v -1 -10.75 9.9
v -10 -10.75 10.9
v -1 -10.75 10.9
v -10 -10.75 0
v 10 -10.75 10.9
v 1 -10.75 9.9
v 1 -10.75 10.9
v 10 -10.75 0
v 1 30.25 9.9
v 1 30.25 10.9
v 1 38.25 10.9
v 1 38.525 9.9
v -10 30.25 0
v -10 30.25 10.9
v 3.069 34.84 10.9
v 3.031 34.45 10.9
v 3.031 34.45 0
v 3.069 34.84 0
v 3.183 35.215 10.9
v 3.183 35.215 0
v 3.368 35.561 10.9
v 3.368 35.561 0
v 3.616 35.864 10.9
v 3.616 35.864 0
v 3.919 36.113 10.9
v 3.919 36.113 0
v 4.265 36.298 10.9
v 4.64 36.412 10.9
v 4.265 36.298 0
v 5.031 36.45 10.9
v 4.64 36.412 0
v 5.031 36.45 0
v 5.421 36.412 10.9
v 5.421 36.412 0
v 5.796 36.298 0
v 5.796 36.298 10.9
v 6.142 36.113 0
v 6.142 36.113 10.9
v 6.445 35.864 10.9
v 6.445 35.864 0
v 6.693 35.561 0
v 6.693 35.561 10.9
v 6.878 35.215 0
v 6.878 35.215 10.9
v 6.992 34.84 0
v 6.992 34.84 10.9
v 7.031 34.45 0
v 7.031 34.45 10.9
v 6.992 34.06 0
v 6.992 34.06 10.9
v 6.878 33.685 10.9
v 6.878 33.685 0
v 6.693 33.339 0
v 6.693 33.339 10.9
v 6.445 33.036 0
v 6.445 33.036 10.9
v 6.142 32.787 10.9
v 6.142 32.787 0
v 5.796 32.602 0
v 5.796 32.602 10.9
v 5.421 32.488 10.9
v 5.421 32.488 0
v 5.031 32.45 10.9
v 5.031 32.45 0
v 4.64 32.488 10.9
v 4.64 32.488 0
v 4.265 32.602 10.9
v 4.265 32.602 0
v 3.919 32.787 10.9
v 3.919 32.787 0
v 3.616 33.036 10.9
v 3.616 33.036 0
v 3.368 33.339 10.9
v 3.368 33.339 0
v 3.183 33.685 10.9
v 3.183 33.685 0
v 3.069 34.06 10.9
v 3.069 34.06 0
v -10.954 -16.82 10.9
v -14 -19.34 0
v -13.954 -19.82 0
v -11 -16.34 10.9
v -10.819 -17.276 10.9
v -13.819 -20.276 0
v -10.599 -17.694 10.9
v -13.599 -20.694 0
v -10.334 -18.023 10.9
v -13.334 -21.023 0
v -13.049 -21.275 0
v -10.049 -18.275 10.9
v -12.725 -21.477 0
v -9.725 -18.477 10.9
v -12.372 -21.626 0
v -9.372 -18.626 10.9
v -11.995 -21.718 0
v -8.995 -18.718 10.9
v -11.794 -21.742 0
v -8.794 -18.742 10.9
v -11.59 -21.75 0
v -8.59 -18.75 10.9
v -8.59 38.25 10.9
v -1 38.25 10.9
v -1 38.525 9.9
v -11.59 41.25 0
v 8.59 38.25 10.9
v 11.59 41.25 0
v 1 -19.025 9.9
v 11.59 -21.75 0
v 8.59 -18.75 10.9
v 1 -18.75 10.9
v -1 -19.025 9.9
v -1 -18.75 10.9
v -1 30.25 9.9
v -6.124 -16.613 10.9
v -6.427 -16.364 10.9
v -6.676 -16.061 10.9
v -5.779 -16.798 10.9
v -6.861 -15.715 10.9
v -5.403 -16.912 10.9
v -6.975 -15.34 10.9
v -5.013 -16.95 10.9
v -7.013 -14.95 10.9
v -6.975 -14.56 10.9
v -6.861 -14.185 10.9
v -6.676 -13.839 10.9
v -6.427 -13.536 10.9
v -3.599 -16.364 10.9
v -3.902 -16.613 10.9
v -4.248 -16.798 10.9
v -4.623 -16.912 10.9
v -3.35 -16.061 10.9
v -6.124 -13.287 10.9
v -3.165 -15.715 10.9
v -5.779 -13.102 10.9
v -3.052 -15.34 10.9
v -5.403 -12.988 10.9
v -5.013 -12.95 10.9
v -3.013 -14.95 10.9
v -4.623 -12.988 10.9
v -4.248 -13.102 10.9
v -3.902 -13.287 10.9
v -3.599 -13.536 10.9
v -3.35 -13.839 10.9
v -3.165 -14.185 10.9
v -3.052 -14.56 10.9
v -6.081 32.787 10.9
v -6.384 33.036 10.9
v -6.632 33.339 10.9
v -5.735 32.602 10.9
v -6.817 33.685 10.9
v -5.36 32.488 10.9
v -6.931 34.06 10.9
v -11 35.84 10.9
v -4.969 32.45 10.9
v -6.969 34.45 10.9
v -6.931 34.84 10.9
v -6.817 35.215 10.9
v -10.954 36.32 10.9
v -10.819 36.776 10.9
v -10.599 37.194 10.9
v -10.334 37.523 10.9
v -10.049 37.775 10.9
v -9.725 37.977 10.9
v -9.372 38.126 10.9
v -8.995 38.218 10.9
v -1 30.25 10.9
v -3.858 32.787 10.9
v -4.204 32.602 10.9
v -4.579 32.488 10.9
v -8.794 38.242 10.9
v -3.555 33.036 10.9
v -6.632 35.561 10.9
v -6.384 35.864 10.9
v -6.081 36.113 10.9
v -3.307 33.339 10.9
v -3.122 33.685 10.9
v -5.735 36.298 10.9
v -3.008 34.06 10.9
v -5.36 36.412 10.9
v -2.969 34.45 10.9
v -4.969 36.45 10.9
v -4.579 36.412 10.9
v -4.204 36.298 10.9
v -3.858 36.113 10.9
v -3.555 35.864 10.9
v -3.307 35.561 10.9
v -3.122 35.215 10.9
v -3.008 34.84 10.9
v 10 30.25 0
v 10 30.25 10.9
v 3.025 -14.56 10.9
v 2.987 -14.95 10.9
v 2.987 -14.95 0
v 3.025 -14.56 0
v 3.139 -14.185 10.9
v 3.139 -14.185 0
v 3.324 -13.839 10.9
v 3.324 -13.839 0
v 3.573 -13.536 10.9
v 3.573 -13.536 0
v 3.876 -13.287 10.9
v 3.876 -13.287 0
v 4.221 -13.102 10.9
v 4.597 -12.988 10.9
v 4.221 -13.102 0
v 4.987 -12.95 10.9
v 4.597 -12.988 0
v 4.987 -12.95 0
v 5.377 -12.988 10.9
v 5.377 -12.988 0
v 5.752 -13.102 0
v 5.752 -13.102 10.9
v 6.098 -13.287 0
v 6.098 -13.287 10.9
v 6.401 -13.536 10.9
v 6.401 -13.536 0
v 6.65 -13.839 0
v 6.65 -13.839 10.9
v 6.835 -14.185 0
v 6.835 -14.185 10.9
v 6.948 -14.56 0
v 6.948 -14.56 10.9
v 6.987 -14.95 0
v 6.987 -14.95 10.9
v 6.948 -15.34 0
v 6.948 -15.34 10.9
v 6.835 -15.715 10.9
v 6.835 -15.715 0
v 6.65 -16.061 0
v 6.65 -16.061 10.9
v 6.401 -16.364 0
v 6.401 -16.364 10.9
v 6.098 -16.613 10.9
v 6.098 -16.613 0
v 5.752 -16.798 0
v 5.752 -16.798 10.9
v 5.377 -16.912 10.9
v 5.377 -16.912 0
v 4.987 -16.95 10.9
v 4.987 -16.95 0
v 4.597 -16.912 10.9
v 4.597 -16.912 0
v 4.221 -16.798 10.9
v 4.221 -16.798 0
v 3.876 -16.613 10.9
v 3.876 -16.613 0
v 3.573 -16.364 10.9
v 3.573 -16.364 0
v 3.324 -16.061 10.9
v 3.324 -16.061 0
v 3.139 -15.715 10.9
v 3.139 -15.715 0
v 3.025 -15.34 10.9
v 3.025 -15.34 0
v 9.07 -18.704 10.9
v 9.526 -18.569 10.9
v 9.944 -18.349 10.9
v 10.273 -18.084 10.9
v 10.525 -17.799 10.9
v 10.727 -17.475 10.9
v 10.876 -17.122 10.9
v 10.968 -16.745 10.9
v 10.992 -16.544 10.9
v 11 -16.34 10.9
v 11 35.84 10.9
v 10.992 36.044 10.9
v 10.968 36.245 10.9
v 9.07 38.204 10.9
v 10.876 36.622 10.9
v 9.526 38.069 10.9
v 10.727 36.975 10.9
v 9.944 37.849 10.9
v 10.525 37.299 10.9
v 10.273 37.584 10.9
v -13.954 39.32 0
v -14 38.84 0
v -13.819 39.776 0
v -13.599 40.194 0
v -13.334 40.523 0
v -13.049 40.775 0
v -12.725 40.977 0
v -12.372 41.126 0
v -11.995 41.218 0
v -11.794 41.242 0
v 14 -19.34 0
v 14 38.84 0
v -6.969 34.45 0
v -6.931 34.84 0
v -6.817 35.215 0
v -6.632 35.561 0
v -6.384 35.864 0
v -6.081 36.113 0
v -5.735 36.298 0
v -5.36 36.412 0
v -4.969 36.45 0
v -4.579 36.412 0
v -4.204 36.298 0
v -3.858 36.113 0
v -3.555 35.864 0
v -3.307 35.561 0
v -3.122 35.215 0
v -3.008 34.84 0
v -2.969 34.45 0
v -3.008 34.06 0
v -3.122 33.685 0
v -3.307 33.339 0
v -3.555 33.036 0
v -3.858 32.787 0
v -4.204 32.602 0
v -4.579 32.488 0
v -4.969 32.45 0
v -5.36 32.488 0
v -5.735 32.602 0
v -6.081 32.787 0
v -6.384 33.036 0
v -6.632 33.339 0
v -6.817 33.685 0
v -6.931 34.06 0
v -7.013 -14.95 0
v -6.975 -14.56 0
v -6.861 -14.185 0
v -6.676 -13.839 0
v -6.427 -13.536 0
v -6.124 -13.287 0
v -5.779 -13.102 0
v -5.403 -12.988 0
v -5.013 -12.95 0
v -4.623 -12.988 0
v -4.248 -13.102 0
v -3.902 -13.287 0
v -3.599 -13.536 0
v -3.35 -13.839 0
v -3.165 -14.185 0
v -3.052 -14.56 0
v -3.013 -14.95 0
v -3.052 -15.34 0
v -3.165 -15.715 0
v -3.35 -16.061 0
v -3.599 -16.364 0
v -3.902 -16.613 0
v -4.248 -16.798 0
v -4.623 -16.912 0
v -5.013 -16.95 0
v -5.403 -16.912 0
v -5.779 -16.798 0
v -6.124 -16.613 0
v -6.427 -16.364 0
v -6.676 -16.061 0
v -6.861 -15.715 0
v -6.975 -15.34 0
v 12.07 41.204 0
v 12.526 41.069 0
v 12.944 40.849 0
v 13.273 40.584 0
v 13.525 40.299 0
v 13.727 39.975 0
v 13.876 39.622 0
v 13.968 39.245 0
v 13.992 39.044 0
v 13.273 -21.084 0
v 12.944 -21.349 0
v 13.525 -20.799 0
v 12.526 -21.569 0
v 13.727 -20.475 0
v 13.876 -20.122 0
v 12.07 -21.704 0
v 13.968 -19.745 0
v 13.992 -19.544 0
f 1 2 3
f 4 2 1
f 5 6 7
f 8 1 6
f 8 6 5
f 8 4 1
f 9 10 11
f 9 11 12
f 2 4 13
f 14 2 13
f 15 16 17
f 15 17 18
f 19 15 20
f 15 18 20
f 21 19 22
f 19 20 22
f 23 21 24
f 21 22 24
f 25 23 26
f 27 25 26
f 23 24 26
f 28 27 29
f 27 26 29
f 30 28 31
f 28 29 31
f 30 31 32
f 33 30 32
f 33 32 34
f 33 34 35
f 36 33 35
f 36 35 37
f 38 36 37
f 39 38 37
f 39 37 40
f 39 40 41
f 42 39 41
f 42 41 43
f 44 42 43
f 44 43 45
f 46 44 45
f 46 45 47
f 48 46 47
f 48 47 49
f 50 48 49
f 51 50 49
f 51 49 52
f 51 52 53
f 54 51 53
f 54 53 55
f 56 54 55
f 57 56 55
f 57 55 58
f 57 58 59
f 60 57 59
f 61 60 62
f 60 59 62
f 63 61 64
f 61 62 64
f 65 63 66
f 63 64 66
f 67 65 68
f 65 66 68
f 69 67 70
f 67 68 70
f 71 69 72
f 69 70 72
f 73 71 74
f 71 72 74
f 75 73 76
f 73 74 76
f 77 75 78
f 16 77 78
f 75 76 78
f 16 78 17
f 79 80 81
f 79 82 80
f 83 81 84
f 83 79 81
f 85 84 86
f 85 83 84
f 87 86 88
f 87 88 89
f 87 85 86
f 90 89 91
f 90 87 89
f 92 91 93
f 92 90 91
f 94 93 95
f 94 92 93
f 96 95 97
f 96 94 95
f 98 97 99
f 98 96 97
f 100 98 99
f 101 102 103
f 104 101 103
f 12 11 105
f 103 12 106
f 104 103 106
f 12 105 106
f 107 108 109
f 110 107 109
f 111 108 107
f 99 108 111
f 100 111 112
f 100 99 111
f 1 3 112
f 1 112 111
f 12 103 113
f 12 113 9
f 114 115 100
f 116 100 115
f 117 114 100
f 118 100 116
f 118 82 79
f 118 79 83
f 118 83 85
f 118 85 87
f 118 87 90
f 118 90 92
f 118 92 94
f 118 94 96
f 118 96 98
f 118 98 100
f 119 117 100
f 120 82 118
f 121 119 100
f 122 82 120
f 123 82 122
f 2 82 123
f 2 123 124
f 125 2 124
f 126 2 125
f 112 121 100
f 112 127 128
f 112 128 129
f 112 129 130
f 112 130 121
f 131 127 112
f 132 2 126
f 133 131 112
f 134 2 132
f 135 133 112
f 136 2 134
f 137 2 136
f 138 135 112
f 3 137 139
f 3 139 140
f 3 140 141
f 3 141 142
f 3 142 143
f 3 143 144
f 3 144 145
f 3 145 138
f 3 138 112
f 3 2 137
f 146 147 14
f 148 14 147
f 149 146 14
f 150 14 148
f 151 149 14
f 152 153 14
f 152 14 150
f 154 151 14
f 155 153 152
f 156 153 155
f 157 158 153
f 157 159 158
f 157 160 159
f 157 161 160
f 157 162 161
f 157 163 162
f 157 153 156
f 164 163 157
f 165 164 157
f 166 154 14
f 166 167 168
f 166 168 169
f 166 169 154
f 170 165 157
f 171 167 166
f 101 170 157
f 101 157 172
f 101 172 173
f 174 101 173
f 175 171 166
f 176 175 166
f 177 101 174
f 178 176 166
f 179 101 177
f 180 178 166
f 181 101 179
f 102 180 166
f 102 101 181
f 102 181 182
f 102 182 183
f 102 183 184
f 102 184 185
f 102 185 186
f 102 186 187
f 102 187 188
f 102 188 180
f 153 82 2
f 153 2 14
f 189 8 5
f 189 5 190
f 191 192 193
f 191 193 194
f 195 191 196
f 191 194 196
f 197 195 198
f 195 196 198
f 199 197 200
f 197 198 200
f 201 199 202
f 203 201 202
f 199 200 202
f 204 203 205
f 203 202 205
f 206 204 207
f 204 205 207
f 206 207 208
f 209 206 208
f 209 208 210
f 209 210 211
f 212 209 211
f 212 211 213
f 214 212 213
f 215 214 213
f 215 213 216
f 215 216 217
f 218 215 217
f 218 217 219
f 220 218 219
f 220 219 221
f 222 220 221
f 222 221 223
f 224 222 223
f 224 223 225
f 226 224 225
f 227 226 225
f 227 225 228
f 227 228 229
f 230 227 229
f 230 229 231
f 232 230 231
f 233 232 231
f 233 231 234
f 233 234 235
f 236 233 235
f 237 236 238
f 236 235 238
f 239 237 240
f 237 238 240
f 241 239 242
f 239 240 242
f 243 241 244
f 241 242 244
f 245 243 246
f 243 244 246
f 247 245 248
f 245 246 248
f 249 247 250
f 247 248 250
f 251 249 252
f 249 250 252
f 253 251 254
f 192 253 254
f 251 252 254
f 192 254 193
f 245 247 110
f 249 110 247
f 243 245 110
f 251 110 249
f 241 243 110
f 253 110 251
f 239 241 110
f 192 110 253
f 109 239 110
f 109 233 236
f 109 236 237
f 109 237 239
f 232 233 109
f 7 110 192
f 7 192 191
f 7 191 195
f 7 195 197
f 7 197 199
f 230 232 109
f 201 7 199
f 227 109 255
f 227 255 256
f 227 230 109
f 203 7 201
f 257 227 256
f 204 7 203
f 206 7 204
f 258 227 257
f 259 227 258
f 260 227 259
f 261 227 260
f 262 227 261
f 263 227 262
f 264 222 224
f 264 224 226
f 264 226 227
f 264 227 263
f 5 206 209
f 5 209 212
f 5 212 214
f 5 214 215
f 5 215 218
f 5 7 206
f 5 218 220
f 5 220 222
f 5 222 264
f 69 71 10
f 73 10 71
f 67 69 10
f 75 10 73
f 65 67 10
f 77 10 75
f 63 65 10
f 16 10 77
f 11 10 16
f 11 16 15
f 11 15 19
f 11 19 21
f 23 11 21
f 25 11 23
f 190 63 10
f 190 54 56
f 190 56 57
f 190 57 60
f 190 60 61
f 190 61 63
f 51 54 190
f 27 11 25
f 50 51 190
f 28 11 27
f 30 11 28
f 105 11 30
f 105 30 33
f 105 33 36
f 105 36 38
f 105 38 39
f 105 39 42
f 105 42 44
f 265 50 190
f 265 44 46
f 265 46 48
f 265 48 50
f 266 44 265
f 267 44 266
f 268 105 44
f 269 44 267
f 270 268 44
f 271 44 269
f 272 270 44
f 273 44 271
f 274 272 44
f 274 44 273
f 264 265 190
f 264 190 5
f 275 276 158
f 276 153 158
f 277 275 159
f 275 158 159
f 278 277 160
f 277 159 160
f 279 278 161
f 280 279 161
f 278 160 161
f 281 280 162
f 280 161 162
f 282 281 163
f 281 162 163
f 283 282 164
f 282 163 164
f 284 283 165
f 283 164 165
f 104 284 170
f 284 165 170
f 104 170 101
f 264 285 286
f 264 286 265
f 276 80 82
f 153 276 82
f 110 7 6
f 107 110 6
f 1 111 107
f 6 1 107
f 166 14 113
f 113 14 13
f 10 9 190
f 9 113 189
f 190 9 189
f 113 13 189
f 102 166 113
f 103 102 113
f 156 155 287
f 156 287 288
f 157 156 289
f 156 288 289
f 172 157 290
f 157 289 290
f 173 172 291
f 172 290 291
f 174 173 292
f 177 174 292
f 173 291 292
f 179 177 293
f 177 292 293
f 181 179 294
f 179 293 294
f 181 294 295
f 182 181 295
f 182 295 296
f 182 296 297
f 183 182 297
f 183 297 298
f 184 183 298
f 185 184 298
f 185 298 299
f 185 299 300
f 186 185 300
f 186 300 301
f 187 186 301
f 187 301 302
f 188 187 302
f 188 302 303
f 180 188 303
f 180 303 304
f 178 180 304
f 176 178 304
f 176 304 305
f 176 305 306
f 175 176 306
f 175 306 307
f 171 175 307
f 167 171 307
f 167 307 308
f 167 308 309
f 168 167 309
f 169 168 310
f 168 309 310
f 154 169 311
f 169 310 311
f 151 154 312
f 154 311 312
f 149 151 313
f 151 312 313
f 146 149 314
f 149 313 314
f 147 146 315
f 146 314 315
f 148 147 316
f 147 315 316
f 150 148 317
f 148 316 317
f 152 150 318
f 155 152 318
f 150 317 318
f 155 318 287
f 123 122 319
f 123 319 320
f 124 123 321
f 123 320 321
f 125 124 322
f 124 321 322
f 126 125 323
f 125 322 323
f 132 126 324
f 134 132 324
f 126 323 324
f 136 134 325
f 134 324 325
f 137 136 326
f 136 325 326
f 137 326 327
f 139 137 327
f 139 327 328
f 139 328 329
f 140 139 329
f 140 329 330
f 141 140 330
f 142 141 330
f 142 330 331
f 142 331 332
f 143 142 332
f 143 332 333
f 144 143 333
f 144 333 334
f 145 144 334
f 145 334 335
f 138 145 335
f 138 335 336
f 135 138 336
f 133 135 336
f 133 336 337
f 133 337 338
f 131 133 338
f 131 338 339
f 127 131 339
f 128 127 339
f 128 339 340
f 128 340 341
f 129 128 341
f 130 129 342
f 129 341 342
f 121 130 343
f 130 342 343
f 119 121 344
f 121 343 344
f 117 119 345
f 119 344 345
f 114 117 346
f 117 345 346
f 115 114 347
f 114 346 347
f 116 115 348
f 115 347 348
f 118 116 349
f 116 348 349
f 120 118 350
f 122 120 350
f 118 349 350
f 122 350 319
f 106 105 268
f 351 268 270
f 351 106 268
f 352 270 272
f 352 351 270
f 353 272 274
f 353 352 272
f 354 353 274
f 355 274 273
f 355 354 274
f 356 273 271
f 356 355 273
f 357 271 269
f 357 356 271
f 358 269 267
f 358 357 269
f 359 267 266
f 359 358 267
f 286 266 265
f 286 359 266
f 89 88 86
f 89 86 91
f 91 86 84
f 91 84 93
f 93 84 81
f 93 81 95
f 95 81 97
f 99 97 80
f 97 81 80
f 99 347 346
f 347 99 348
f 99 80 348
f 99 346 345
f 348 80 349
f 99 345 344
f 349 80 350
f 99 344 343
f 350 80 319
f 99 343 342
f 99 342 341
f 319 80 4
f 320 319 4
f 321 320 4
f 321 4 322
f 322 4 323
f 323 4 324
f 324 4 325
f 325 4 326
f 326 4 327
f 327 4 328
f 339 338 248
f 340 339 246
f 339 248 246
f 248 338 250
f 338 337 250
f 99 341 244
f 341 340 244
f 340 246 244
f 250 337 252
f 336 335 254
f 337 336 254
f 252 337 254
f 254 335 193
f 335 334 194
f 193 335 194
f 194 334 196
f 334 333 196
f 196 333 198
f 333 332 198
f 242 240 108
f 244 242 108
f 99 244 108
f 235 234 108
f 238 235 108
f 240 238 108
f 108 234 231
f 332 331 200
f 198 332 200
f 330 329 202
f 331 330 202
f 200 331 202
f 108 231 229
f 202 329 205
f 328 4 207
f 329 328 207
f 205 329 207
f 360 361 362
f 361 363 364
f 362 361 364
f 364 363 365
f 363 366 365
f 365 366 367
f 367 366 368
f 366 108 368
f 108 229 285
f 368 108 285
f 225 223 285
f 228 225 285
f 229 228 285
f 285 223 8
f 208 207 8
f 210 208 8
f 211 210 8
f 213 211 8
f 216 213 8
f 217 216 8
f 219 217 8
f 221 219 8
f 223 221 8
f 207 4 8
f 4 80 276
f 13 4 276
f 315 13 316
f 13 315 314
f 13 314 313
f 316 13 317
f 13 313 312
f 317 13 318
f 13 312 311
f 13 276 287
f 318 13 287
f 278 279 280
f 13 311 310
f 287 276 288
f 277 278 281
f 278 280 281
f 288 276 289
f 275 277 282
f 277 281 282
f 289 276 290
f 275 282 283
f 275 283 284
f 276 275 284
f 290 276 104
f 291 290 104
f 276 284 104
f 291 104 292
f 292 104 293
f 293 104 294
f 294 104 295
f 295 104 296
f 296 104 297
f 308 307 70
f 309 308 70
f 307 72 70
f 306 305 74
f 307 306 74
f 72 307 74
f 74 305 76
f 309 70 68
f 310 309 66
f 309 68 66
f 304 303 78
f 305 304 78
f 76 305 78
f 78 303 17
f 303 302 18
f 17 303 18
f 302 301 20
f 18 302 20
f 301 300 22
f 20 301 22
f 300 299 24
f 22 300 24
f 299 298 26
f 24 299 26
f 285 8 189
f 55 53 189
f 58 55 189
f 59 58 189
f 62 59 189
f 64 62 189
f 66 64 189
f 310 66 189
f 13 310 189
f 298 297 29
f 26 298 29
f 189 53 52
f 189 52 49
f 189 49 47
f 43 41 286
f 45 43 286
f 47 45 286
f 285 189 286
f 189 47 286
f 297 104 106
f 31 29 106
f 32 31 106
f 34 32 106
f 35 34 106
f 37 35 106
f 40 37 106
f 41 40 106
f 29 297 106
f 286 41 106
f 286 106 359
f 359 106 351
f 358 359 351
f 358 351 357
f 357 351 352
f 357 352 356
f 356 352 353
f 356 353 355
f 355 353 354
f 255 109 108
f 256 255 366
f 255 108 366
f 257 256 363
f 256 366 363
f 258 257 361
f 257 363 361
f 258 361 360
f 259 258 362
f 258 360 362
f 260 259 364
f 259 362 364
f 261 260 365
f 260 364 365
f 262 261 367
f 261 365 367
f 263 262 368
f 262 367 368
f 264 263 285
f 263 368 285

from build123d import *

# Parameters (mm, degrees)
SKETCH1_W           = 28
SKETCH1_H           = 63
SKETCH1_W_2         = 20
SKETCH1_H_2         = 41
BOSS_EXTRUDE1_DEPTH = 10.9
SKETCH2_R           = 2
CUT_EXTRUDE1_DEPTH  = 45.904036567
CHAMFER1_SIZE       = 10.9
CHAMFER1_SIZE_2     = 3
SKETCH3_W           = 2
SKETCH3_H           = 1
CUT_EXTRUDE2_DEPTH  = 65.248521384
FILLET1_R           = 2.5


with BuildPart() as part:
    # Sketch1 → Boss-Extrude1 (new body)
    with BuildSketch(Plane.XY):
        with Locations((0, 9.75)):
            Rectangle(SKETCH1_W, SKETCH1_H)
        with Locations((0, 9.75)):
            Rectangle(SKETCH1_W_2, SKETCH1_H_2, mode=Mode.SUBTRACT)
    extrude(amount=BOSS_EXTRUDE1_DEPTH)

    # Sketch2 → Cut-Extrude1 (cut, through all)
    with BuildSketch(Plane(origin=(0, 0, 0), x_dir=(-1, 0, 0), z_dir=(0, 0, -1))):
        with Locations((5.013249621, -14.95)):
            Circle(SKETCH2_R)
        with Locations((-4.986750379, -14.95)):
            Circle(SKETCH2_R)
        with Locations((-5.030525248, 34.45)):
            Circle(SKETCH2_R)
        with Locations((4.969474752, 34.45)):
            Circle(SKETCH2_R)
    extrude(amount=-CUT_EXTRUDE1_DEPTH, mode=Mode.SUBTRACT)

    # Chamfer1
    # the kernel refuses this chamfer: 10.9, 3 mm, written as the material it takes off along each edge
    with BuildSketch(Plane(origin=(14, -50.052400278, 10.9), x_dir=(0.010219792224504668, 0, -0.9999477765598), z_dir=(0, 1, 0)), Plane(origin=(-14, 69.552400278, 10.9), x_dir=(-0.010219792224504668, 0, -0.9999477765598), z_dir=(0, -1, 0))) as chamfer1_piece_1:
        Polygon((CHAMFER1_SIZE * 0.99994777656, CHAMFER1_SIZE * 0.0102197922245), (-CHAMFER1_SIZE_2 * 0.0102197922245, CHAMFER1_SIZE_2 * 0.99994777656), (0, 0), align=None)
    extrude(amount=119.604800556, mode=Mode.SUBTRACT)
    with BuildSketch(Plane(origin=(-42.302400278, -21.75, 10.9), x_dir=(0, -0.010219792224504825, -0.9999477765598), z_dir=(1, 0, 0))) as chamfer1_piece_2:
        Polygon((CHAMFER1_SIZE * 0.99994777656, CHAMFER1_SIZE * 0.0102197922245), (-CHAMFER1_SIZE_2 * 0.0102197922245, CHAMFER1_SIZE_2 * 0.99994777656), (0, 0), align=None)
    extrude(amount=84.604800556, mode=Mode.SUBTRACT)
    with BuildSketch(Plane(origin=(42.302400278, 41.25, 10.9), x_dir=(0, -0.9910207476808653, 0.1337081809989902), z_dir=(-1, 0, 0))) as chamfer1_piece_3:
        Polygon((CHAMFER1_SIZE_2 * 0.991020747681, -CHAMFER1_SIZE_2 * 0.133708180999), (-CHAMFER1_SIZE * 0.133708180999, -CHAMFER1_SIZE * 0.991020747681), (0, 0), align=None)
    extrude(amount=84.604800556, mode=Mode.SUBTRACT)

    # Sketch3 → Cut-Extrude2 (cut, through all)
    with BuildSketch(Plane(origin=(0, 40, 0), x_dir=(1, 0, 0), z_dir=(0, 1, 0))):
        with Locations((0, -10.4)):
            Rectangle(SKETCH3_W, SKETCH3_H)
    extrude(amount=-CUT_EXTRUDE2_DEPTH, mode=Mode.SUBTRACT)

    # Fillet1
    fillet1_edges = [part.edges().sort_by_distance(p)[0] for p in [
        (-12.5, -20.25, 5.45),
        (-12.5, 39.75, 5.45),
        (12.5, -20.25, 5.45),
        (12.5, 39.75, 5.45),
    ]]
    fillet(fillet1_edges, radius=FILLET1_R)


solid = part.part
